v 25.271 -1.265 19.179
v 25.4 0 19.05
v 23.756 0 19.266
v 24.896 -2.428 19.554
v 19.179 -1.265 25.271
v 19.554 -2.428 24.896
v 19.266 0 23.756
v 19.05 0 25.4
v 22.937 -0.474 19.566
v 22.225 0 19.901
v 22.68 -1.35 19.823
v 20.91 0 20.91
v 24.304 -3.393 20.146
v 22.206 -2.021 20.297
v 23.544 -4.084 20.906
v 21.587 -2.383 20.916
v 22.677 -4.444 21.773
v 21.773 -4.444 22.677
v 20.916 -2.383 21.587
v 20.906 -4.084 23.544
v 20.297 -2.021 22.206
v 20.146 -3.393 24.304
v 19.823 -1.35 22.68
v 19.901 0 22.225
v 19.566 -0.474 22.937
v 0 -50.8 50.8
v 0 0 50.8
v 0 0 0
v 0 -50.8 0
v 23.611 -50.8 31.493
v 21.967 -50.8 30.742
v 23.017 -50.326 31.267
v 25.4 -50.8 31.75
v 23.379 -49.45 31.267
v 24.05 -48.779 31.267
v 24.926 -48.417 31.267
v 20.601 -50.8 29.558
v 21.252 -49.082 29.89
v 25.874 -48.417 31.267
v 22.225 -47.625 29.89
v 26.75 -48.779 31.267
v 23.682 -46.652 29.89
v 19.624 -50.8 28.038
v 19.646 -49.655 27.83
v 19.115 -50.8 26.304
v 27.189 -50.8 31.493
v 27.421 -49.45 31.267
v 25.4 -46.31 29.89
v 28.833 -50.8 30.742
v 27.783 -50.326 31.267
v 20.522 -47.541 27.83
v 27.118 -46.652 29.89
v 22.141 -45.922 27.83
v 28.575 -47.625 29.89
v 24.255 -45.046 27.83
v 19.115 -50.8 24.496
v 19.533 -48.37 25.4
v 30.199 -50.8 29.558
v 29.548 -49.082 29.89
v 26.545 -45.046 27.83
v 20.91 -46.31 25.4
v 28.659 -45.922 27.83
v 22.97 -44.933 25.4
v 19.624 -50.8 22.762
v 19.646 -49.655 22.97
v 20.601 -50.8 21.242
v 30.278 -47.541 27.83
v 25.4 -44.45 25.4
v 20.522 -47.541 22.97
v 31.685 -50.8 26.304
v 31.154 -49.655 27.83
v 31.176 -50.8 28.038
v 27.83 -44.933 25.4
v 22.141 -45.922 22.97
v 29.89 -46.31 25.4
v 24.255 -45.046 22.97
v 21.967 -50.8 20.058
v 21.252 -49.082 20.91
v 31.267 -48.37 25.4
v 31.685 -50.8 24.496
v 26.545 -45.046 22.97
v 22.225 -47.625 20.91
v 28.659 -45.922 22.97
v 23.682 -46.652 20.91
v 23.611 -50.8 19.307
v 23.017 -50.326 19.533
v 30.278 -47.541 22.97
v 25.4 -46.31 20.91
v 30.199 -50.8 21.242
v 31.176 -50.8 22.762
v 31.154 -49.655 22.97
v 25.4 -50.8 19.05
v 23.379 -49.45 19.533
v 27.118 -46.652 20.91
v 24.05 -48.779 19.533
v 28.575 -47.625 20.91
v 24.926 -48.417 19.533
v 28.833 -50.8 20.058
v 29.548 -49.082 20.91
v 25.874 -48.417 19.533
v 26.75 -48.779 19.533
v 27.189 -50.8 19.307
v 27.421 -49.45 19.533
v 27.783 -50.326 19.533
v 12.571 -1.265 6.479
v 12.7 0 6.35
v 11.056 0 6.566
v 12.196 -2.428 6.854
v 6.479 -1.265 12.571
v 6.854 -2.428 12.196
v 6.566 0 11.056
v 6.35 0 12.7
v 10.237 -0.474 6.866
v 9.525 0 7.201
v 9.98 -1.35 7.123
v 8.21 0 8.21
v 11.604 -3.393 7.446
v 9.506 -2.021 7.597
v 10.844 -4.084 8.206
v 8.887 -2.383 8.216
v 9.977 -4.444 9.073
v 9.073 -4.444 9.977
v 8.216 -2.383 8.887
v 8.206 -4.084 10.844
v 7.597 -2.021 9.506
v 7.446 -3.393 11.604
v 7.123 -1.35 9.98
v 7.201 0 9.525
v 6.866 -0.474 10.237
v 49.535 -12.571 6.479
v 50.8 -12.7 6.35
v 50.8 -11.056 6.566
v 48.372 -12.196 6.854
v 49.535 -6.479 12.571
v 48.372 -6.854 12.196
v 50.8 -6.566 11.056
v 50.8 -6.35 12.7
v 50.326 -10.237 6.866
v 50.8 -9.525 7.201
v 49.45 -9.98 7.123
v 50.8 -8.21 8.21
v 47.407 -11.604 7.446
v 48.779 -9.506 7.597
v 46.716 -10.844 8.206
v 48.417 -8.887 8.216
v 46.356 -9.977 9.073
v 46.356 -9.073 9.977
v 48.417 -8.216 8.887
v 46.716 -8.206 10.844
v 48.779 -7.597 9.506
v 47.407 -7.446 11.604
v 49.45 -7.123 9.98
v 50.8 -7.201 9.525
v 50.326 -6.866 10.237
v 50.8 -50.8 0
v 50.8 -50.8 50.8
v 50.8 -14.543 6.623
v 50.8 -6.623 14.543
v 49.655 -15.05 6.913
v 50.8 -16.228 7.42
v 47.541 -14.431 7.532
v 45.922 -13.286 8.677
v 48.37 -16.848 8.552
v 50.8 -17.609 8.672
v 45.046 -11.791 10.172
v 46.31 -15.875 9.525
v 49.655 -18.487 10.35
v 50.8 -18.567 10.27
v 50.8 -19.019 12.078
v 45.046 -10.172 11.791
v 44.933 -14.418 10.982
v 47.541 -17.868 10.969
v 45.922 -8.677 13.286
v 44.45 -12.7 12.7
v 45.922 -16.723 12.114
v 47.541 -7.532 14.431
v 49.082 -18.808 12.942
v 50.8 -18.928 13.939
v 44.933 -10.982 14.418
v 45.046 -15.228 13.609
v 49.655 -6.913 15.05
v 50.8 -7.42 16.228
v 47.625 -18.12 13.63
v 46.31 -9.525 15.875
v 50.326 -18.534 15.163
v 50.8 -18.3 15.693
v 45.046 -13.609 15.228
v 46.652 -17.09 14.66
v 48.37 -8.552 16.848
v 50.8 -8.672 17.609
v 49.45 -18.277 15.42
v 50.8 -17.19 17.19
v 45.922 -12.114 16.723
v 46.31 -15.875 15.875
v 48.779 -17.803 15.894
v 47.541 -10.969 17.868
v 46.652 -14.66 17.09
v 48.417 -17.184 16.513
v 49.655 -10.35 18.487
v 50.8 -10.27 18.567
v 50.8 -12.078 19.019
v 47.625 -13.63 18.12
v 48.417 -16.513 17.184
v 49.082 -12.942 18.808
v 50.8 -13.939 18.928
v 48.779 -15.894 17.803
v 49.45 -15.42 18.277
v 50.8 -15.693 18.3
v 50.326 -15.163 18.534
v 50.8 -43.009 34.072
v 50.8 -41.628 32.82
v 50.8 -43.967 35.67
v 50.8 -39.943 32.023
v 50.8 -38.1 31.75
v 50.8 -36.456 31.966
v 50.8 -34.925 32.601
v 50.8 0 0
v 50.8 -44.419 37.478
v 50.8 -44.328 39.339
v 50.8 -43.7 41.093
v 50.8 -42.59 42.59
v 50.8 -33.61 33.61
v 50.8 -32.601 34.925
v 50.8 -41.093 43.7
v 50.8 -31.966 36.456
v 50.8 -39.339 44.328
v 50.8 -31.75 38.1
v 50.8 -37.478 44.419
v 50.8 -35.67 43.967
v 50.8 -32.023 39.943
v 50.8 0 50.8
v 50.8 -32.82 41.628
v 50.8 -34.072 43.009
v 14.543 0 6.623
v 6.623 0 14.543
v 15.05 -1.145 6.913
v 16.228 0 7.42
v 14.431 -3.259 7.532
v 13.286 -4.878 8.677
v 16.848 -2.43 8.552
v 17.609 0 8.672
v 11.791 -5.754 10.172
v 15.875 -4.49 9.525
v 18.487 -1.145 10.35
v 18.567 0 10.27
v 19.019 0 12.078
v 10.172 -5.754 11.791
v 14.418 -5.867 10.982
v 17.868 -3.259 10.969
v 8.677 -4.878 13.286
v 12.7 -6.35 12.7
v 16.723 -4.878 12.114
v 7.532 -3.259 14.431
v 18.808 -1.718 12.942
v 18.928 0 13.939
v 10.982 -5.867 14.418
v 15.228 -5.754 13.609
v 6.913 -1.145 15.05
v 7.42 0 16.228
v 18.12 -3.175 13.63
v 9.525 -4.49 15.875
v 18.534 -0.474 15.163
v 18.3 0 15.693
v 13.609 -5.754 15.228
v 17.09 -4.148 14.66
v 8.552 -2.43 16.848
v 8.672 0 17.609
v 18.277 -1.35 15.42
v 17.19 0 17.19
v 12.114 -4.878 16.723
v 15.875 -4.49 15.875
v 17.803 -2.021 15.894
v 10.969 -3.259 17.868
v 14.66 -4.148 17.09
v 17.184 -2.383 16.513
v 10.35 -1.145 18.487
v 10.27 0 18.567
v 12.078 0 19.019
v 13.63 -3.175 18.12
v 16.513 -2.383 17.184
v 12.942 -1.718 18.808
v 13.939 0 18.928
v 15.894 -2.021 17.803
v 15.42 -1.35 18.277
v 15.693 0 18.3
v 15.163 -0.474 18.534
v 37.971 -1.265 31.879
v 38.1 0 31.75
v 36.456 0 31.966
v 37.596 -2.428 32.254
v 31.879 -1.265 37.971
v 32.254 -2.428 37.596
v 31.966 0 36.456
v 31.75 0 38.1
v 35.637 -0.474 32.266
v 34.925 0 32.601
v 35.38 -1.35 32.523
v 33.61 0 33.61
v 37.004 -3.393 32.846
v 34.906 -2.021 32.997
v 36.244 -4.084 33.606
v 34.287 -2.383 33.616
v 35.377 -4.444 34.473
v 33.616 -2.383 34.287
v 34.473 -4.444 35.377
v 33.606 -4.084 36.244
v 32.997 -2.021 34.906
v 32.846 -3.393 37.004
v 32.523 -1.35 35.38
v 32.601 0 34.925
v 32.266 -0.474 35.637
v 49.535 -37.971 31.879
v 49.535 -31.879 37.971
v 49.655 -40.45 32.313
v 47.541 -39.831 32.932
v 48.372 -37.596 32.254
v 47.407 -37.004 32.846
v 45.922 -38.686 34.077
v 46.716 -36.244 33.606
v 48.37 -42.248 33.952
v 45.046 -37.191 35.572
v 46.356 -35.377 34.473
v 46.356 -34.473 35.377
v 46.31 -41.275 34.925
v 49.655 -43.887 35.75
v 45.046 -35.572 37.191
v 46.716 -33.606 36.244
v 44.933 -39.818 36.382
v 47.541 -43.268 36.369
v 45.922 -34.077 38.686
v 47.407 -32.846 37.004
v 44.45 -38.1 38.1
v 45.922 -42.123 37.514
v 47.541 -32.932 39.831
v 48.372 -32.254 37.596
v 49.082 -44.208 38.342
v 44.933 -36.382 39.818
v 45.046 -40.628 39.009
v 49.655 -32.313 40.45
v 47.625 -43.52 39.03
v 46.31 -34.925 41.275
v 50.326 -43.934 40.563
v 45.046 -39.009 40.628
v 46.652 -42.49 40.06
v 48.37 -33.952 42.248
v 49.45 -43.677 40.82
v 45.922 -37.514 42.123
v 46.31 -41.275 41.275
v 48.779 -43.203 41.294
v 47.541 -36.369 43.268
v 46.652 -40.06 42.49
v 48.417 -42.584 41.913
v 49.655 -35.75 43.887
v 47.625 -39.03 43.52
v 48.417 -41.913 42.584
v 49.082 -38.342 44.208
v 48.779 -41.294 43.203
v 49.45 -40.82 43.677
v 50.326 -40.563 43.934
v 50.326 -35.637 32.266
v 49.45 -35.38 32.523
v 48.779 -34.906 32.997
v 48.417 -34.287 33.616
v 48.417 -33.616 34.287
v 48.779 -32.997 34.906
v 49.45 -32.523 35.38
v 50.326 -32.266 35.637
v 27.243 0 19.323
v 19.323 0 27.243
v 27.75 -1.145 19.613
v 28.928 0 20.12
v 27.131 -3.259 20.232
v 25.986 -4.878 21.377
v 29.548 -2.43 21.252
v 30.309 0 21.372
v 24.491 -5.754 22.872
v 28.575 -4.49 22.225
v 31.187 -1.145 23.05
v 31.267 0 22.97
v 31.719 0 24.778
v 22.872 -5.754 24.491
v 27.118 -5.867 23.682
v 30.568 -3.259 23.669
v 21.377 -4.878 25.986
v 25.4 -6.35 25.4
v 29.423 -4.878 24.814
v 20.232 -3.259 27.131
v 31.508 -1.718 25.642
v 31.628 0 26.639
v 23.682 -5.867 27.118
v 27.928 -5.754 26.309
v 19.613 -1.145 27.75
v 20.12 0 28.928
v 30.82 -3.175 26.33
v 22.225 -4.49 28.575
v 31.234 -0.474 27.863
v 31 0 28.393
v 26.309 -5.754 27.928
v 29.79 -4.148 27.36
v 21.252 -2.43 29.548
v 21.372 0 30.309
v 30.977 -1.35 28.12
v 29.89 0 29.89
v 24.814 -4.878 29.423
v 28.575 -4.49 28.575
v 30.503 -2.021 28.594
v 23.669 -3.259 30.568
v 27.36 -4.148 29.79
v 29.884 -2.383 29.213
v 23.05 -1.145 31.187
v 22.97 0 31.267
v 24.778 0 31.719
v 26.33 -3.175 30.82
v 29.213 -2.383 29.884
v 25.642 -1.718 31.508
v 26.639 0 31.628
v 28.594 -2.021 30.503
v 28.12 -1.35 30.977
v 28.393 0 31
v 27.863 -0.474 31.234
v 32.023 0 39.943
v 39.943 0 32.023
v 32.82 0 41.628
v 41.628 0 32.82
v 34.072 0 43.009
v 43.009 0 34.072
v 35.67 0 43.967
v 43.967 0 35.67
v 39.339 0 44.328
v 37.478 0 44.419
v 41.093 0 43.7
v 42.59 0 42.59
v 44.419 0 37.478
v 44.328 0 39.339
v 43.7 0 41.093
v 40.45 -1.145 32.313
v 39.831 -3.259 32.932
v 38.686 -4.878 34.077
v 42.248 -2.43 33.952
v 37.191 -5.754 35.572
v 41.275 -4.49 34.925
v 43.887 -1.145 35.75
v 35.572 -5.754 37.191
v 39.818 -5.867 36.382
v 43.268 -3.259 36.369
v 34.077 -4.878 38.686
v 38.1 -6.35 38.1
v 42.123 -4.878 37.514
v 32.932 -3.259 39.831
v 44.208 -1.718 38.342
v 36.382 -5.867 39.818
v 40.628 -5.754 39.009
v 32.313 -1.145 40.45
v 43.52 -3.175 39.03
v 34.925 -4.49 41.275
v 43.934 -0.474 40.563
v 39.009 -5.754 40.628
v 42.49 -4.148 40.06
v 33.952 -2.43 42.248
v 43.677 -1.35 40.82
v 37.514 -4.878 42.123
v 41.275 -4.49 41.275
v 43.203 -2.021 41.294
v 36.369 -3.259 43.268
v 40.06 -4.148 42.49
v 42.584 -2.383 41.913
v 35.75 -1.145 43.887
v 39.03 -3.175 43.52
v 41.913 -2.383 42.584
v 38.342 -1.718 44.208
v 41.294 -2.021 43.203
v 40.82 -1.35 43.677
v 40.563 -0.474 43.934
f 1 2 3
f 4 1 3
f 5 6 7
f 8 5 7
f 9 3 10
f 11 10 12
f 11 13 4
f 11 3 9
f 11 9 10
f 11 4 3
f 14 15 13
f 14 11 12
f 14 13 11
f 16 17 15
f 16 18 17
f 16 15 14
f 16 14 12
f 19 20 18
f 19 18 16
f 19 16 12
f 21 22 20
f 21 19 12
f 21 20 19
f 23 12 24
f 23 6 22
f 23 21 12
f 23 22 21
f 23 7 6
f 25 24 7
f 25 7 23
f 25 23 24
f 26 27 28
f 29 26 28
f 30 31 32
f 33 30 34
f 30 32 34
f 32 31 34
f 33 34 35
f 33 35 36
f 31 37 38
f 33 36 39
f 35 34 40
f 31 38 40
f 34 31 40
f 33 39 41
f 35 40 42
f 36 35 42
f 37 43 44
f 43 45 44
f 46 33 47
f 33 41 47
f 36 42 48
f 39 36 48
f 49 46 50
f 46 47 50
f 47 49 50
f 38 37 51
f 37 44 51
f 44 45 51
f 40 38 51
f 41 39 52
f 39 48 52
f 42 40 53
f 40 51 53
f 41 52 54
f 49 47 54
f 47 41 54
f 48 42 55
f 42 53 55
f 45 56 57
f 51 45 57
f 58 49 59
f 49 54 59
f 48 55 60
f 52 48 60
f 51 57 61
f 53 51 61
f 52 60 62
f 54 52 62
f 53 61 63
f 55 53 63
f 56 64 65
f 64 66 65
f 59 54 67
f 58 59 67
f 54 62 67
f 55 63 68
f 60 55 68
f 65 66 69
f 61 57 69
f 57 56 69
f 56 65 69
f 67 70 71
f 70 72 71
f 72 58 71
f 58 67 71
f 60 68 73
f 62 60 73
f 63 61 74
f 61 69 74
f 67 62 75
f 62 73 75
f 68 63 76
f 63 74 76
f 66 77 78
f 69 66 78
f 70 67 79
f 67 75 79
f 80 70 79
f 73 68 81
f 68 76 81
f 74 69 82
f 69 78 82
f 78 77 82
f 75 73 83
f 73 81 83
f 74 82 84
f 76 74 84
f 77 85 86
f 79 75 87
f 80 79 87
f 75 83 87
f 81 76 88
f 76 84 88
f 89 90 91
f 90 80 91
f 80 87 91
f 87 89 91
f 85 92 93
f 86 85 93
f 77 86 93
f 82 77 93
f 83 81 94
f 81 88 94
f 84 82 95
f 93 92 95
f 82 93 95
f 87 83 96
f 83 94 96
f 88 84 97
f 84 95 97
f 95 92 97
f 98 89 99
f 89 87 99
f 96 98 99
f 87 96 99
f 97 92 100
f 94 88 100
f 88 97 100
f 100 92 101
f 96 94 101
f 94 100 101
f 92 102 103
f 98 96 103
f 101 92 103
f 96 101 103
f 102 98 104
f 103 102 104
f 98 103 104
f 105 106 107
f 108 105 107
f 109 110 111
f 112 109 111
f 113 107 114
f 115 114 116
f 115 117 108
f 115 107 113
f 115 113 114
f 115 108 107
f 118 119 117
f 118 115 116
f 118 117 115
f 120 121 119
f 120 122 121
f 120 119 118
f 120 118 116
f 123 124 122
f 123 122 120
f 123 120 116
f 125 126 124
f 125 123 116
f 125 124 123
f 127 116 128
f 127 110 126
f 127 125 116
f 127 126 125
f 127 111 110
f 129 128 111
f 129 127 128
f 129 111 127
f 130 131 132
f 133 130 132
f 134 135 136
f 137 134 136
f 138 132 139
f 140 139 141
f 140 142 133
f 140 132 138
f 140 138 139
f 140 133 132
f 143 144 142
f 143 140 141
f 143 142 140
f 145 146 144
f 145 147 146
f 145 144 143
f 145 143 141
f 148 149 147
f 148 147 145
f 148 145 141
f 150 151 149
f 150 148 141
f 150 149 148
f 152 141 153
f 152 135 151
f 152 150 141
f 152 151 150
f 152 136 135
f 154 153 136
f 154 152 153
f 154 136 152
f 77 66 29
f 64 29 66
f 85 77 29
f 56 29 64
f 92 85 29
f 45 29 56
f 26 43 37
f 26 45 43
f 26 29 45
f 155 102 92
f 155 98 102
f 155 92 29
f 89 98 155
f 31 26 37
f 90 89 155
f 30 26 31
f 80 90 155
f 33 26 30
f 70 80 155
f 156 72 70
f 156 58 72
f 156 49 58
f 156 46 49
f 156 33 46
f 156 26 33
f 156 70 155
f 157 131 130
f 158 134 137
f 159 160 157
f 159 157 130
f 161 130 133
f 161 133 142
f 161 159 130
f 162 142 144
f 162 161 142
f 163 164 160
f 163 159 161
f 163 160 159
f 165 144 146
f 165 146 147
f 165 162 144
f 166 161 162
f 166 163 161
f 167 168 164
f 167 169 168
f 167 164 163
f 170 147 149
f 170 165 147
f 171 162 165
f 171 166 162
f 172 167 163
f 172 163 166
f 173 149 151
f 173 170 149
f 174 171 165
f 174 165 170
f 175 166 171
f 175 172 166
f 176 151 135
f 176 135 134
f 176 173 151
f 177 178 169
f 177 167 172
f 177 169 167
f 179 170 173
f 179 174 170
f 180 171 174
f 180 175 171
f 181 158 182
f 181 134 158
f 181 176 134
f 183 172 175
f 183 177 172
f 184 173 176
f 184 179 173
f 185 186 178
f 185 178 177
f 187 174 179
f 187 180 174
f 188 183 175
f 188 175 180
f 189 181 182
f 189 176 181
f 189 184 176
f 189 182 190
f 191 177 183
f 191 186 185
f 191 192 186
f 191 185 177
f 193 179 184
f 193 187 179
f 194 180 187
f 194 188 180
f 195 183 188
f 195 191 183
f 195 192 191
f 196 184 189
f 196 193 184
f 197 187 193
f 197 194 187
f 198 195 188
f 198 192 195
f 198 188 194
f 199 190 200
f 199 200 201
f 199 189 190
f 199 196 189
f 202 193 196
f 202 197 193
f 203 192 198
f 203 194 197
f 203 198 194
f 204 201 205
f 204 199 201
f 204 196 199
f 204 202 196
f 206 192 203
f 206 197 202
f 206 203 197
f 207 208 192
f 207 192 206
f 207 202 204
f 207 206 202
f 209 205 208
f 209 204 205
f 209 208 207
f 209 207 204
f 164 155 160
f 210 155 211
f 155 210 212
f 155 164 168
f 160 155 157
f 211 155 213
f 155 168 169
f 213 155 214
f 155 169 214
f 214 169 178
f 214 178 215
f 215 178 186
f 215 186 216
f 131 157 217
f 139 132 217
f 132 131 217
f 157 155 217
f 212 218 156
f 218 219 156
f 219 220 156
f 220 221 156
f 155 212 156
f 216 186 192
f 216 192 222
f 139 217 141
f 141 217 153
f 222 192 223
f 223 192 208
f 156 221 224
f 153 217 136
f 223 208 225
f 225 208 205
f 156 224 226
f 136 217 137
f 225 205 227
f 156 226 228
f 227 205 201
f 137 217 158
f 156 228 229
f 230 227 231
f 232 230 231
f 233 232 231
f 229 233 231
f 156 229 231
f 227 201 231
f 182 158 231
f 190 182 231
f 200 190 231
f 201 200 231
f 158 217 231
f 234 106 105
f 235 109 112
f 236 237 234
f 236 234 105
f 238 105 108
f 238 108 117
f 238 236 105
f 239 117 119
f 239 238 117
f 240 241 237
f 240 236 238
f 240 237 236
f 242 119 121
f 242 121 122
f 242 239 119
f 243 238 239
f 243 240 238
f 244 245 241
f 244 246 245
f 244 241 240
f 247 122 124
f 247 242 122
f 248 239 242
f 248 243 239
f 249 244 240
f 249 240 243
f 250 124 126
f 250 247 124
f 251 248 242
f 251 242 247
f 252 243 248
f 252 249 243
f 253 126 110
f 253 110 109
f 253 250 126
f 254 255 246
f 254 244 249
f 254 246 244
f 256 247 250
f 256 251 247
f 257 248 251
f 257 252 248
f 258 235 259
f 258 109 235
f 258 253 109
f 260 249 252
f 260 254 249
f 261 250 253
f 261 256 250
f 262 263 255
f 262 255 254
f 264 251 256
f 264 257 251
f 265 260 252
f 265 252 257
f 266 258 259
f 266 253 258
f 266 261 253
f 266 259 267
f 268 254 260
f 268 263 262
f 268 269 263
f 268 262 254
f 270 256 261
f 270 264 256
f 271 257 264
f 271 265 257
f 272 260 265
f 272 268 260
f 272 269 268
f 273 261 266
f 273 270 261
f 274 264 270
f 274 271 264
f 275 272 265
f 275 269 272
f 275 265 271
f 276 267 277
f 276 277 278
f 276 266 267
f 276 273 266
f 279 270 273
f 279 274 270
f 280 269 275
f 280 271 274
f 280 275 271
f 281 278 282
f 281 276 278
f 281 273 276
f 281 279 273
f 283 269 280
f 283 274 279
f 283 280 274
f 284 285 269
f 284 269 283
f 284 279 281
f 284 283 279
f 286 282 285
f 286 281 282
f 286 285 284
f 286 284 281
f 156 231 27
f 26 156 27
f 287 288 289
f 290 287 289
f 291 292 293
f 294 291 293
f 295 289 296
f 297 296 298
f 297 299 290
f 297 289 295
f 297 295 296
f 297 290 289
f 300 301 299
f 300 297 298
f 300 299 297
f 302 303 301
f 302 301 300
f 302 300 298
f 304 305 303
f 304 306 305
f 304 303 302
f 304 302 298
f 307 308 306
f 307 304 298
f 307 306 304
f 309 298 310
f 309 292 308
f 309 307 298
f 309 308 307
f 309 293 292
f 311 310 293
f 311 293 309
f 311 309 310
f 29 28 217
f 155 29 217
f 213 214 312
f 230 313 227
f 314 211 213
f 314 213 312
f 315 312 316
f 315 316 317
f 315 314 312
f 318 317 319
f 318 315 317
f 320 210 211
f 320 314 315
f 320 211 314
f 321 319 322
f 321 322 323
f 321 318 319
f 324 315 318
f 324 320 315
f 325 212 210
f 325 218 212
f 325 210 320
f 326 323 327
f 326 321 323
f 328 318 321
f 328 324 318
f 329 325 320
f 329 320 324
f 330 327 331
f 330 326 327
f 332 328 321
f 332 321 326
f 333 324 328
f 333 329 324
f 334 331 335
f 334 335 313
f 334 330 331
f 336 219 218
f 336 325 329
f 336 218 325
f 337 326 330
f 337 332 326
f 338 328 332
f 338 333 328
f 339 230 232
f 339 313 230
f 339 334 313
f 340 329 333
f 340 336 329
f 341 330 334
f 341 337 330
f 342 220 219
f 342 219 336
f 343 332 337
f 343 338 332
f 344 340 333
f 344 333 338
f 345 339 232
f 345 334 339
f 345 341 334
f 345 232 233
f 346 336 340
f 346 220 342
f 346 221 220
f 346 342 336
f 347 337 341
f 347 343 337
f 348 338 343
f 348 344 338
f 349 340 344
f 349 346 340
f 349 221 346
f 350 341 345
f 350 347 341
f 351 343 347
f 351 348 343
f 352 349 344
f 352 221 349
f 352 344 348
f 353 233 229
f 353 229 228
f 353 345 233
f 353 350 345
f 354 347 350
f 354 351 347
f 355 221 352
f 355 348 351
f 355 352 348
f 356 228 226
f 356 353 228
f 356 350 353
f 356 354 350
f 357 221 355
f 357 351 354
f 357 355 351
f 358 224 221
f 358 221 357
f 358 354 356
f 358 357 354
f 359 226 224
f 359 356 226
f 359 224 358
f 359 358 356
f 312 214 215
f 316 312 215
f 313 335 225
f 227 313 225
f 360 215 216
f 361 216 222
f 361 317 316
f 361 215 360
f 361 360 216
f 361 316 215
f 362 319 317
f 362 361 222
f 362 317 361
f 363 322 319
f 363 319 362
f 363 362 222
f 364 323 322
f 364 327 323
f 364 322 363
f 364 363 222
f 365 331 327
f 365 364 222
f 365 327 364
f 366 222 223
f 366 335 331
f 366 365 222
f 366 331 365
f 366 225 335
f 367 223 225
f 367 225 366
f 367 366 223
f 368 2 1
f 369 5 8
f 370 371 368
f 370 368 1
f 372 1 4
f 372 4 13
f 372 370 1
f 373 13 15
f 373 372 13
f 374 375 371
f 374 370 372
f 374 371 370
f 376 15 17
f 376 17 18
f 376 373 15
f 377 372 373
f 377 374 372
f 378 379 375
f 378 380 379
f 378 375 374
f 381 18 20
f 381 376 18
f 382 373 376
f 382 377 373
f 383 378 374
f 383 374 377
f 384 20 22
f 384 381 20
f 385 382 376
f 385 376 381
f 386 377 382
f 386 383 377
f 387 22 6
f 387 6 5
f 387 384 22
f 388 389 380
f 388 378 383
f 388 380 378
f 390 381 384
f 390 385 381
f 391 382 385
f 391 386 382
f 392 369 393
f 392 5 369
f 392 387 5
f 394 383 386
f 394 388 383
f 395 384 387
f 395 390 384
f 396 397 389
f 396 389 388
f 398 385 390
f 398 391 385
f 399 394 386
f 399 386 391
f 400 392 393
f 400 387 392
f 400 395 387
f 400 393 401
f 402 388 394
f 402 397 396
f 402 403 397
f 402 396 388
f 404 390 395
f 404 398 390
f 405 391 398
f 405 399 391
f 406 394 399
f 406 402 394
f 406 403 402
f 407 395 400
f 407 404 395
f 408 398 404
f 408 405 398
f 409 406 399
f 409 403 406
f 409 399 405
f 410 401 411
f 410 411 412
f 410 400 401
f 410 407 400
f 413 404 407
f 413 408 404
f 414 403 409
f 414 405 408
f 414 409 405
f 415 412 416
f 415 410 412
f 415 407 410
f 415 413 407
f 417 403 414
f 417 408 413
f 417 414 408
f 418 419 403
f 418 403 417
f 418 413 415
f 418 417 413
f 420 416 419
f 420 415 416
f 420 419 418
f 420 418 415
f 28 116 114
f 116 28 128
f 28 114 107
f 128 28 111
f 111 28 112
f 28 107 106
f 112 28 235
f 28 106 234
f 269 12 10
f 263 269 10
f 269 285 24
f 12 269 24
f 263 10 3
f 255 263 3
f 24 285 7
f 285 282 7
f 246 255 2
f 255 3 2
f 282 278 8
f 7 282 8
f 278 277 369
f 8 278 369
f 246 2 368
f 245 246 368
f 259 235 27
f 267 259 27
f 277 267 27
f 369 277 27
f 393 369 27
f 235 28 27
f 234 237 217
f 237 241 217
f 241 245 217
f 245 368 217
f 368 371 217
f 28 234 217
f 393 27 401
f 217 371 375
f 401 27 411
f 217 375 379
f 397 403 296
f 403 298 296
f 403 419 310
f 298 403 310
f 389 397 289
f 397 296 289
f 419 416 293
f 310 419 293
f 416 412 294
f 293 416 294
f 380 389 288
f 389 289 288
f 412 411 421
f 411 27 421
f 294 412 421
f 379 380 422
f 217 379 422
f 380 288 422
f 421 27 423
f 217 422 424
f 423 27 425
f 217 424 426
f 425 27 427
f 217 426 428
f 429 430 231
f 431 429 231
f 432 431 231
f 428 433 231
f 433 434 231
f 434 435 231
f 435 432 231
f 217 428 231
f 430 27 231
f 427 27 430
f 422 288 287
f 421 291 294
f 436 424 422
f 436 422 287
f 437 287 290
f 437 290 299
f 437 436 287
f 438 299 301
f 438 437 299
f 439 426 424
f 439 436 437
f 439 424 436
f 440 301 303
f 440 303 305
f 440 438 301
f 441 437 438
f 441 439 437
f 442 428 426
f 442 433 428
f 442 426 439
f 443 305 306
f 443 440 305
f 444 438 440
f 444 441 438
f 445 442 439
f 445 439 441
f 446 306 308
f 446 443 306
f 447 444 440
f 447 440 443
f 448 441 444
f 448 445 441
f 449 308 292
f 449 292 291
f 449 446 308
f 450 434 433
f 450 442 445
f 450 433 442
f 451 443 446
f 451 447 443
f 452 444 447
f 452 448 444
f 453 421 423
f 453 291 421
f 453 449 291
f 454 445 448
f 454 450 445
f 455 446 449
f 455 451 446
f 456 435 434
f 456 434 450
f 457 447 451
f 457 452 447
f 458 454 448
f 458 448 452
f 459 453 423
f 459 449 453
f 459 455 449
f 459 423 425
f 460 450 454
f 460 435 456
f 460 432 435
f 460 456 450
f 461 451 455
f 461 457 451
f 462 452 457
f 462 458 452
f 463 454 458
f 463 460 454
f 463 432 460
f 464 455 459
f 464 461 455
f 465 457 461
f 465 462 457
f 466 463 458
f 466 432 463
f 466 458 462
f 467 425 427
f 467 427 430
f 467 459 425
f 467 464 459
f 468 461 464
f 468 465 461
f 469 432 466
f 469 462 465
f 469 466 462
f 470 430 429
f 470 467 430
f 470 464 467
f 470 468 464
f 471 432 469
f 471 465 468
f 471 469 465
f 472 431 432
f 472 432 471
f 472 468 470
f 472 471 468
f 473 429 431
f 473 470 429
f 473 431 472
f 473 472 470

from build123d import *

# Parameters (mm, degrees)
F1_DEPTH = 50.8


with BuildPart() as f1:
    # F0 (on Front) → F1 (new body)
    with BuildSketch(Plane.XZ):
        Polygon((0, 50.8), (0, 0), (50.8, 0), (50.8, 2.1089113951), (50.8, 50.8), align=None)
    extrude(amount=F1_DEPTH)

    # F2 (on face) → F3 (revolve, cut)
    with BuildSketch(Plane.YZ.offset(50.8)):
        with BuildLine():
            ThreePointArc((-31.75, 38.1), (-35.6699602045, 43.9666350314), (-42.5901280605, 42.5901280605))
            Line((-42.5901280605, 42.5901280605), (-33.6098719395, 33.6098719395))
            ThreePointArc((-33.6098719395, 33.6098719395), (-32.2333649686, 35.6699602045), (-31.75, 38.1))
        make_face()
        with BuildLine():
            ThreePointArc((-6.35, 12.7), (-10.2699602045, 18.5666350314), (-17.1901280605, 17.1901280605))
            Line((-17.1901280605, 17.1901280605), (-8.2098719395, 8.2098719395))
            ThreePointArc((-8.2098719395, 8.2098719395), (-6.8333649686, 10.2699602045), (-6.35, 12.7))
        make_face()
    revolve(axis=Axis((50.8, -25.4, 25.4), (0, 0.7071067812, -0.7071067812)), mode=Mode.SUBTRACT)

    # F4 (on face) → F5 (revolve, cut)
    with BuildSketch(Plane.XZ.offset(50.8)):
        with BuildLine():
            Line((25.4, 19.05), (25.4, 31.75))
            ThreePointArc((25.4, 31.75), (19.05, 25.4), (25.4, 19.05))
        make_face()
    revolve(axis=Axis((25.4, -50.8, 25.4), (0, 0, -1)), mode=Mode.SUBTRACT)

    # F6 (on face) → F7 (revolve, cut)
    with BuildSketch(Plane(origin=(0, 0, 0), x_dir=(-1, 0, 0), z_dir=(0, 1, 0))):
        with BuildLine():
            Line((-17.1901280605, 17.1901280605), (-8.2098719395, 8.2098719395))
            ThreePointArc((-8.2098719395, 8.2098719395), (-6.8333649686, 10.2699602045), (-6.35, 12.7))
            ThreePointArc((-6.35, 12.7), (-10.2699602045, 18.5666350314), (-17.1901280605, 17.1901280605))
        make_face()
        with BuildLine():
            ThreePointArc((-19.05, 25.4), (-22.9699602045, 31.2666350314), (-29.8901280605, 29.8901280605))
            Line((-29.8901280605, 29.8901280605), (-20.9098719395, 20.9098719395))
            ThreePointArc((-20.9098719395, 20.9098719395), (-19.5333649686, 22.9699602045), (-19.05, 25.4))
        make_face()
        with BuildLine():
            ThreePointArc((-31.75, 38.1), (-35.6699602045, 43.9666350314), (-42.5901280605, 42.5901280605))
            Line((-42.5901280605, 42.5901280605), (-33.6098719395, 33.6098719395))
            ThreePointArc((-33.6098719395, 33.6098719395), (-32.2333649686, 35.6699602045), (-31.75, 38.1))
        make_face()
    revolve(axis=Axis((25.4, 0, 25.4), (-0.7071067812, 0, -0.7071067812)), mode=Mode.SUBTRACT)


solid = f1.part
